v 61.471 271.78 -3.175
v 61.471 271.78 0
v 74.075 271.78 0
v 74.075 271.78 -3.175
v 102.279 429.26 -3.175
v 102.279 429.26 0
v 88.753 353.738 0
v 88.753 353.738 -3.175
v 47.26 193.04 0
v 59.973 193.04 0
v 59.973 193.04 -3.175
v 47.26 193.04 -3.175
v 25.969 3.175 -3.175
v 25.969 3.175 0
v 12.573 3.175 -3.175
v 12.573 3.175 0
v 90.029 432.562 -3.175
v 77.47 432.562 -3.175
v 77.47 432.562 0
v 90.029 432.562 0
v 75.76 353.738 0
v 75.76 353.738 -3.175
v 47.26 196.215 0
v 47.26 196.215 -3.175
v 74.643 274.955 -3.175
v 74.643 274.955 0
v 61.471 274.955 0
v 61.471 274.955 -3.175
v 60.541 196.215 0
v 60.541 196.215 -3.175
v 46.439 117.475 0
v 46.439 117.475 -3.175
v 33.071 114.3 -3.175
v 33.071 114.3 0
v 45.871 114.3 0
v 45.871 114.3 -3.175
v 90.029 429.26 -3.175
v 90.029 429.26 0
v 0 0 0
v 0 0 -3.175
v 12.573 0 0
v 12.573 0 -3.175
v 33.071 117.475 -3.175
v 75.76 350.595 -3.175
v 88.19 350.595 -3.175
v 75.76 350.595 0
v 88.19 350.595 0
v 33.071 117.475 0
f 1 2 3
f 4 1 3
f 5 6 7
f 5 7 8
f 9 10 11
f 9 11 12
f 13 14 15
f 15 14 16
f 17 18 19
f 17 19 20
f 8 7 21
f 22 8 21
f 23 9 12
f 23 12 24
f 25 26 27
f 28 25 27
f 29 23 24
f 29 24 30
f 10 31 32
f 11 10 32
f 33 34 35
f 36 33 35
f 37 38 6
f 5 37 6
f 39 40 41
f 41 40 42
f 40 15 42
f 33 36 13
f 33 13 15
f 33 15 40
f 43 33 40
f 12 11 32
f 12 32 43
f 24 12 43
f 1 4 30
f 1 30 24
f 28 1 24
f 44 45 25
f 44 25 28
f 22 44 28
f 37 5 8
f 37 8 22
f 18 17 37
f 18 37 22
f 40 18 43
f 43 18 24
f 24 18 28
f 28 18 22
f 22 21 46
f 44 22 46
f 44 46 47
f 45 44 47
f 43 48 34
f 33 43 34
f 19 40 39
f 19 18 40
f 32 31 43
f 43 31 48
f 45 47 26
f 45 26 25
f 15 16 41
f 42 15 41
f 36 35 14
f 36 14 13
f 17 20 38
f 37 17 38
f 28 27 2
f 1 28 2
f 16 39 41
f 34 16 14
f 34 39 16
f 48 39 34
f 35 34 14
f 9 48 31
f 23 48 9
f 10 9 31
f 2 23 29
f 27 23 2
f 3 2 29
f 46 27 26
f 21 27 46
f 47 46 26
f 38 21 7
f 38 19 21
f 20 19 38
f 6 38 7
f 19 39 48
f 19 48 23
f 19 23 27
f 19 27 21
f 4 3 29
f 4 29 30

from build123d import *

# Parameters (mm, degrees)
SKETCH1_W          = 25.4
SKETCH1_H          = 3.175
SKETCH2_W          = 25.4
SKETCH2_H          = 3.175
CUT_EXTRUDE1_DEPTH = 5.08


with BuildPart() as part:
    # Sketch1 → Loft1 section 0
    with BuildSketch(Plane(origin=(0, 0, 0), x_dir=(1, 0, 0), z_dir=(0, 1, 0))):
        with Locations((12.7, 1.5875)):
            Rectangle(SKETCH1_W, SKETCH1_H)
    # Sketch2 → Loft1 section 1
    with BuildSketch(Plane(origin=(0, 432.562, 0), x_dir=(1, 0, 0), z_dir=(0, 1, 0))):
        with Locations((90.17, 1.5875)):
            Rectangle(SKETCH2_W, SKETCH2_H)
    loft()

    # Sketch3 → Cut-Extrude1 (cut)
    with BuildSketch(Plane.XY):
        Polygon((90.028717652, 432.562), (90.028717652, 429.26), (102.278625954, 429.26), (102.87, 432.562), align=None)
        Polygon((12.572909357, 3.175), (12.572909357, 0), (25.4, 0), (25.96862889, 3.175), align=None)
        Polygon((33.071424259, 117.475), (33.071424259, 114.3), (45.870640047, 114.3), (46.439268937, 117.475), align=None)
        Polygon((75.759721917, 353.738084411), (75.759721917, 350.595188566), (88.190095427, 350.595188566), (88.752974601, 353.738084411), align=None)
        Polygon((61.470871422, 274.955), (61.470871422, 271.78), (74.074633001, 271.78), (74.643261891, 274.955), align=None)
        Polygon((47.260398049, 193.04), (47.260398049, 196.215), (60.541265414, 196.215), (59.972636524, 193.04), align=None)
    extrude(amount=-CUT_EXTRUDE1_DEPTH, mode=Mode.SUBTRACT)


solid = part.part
